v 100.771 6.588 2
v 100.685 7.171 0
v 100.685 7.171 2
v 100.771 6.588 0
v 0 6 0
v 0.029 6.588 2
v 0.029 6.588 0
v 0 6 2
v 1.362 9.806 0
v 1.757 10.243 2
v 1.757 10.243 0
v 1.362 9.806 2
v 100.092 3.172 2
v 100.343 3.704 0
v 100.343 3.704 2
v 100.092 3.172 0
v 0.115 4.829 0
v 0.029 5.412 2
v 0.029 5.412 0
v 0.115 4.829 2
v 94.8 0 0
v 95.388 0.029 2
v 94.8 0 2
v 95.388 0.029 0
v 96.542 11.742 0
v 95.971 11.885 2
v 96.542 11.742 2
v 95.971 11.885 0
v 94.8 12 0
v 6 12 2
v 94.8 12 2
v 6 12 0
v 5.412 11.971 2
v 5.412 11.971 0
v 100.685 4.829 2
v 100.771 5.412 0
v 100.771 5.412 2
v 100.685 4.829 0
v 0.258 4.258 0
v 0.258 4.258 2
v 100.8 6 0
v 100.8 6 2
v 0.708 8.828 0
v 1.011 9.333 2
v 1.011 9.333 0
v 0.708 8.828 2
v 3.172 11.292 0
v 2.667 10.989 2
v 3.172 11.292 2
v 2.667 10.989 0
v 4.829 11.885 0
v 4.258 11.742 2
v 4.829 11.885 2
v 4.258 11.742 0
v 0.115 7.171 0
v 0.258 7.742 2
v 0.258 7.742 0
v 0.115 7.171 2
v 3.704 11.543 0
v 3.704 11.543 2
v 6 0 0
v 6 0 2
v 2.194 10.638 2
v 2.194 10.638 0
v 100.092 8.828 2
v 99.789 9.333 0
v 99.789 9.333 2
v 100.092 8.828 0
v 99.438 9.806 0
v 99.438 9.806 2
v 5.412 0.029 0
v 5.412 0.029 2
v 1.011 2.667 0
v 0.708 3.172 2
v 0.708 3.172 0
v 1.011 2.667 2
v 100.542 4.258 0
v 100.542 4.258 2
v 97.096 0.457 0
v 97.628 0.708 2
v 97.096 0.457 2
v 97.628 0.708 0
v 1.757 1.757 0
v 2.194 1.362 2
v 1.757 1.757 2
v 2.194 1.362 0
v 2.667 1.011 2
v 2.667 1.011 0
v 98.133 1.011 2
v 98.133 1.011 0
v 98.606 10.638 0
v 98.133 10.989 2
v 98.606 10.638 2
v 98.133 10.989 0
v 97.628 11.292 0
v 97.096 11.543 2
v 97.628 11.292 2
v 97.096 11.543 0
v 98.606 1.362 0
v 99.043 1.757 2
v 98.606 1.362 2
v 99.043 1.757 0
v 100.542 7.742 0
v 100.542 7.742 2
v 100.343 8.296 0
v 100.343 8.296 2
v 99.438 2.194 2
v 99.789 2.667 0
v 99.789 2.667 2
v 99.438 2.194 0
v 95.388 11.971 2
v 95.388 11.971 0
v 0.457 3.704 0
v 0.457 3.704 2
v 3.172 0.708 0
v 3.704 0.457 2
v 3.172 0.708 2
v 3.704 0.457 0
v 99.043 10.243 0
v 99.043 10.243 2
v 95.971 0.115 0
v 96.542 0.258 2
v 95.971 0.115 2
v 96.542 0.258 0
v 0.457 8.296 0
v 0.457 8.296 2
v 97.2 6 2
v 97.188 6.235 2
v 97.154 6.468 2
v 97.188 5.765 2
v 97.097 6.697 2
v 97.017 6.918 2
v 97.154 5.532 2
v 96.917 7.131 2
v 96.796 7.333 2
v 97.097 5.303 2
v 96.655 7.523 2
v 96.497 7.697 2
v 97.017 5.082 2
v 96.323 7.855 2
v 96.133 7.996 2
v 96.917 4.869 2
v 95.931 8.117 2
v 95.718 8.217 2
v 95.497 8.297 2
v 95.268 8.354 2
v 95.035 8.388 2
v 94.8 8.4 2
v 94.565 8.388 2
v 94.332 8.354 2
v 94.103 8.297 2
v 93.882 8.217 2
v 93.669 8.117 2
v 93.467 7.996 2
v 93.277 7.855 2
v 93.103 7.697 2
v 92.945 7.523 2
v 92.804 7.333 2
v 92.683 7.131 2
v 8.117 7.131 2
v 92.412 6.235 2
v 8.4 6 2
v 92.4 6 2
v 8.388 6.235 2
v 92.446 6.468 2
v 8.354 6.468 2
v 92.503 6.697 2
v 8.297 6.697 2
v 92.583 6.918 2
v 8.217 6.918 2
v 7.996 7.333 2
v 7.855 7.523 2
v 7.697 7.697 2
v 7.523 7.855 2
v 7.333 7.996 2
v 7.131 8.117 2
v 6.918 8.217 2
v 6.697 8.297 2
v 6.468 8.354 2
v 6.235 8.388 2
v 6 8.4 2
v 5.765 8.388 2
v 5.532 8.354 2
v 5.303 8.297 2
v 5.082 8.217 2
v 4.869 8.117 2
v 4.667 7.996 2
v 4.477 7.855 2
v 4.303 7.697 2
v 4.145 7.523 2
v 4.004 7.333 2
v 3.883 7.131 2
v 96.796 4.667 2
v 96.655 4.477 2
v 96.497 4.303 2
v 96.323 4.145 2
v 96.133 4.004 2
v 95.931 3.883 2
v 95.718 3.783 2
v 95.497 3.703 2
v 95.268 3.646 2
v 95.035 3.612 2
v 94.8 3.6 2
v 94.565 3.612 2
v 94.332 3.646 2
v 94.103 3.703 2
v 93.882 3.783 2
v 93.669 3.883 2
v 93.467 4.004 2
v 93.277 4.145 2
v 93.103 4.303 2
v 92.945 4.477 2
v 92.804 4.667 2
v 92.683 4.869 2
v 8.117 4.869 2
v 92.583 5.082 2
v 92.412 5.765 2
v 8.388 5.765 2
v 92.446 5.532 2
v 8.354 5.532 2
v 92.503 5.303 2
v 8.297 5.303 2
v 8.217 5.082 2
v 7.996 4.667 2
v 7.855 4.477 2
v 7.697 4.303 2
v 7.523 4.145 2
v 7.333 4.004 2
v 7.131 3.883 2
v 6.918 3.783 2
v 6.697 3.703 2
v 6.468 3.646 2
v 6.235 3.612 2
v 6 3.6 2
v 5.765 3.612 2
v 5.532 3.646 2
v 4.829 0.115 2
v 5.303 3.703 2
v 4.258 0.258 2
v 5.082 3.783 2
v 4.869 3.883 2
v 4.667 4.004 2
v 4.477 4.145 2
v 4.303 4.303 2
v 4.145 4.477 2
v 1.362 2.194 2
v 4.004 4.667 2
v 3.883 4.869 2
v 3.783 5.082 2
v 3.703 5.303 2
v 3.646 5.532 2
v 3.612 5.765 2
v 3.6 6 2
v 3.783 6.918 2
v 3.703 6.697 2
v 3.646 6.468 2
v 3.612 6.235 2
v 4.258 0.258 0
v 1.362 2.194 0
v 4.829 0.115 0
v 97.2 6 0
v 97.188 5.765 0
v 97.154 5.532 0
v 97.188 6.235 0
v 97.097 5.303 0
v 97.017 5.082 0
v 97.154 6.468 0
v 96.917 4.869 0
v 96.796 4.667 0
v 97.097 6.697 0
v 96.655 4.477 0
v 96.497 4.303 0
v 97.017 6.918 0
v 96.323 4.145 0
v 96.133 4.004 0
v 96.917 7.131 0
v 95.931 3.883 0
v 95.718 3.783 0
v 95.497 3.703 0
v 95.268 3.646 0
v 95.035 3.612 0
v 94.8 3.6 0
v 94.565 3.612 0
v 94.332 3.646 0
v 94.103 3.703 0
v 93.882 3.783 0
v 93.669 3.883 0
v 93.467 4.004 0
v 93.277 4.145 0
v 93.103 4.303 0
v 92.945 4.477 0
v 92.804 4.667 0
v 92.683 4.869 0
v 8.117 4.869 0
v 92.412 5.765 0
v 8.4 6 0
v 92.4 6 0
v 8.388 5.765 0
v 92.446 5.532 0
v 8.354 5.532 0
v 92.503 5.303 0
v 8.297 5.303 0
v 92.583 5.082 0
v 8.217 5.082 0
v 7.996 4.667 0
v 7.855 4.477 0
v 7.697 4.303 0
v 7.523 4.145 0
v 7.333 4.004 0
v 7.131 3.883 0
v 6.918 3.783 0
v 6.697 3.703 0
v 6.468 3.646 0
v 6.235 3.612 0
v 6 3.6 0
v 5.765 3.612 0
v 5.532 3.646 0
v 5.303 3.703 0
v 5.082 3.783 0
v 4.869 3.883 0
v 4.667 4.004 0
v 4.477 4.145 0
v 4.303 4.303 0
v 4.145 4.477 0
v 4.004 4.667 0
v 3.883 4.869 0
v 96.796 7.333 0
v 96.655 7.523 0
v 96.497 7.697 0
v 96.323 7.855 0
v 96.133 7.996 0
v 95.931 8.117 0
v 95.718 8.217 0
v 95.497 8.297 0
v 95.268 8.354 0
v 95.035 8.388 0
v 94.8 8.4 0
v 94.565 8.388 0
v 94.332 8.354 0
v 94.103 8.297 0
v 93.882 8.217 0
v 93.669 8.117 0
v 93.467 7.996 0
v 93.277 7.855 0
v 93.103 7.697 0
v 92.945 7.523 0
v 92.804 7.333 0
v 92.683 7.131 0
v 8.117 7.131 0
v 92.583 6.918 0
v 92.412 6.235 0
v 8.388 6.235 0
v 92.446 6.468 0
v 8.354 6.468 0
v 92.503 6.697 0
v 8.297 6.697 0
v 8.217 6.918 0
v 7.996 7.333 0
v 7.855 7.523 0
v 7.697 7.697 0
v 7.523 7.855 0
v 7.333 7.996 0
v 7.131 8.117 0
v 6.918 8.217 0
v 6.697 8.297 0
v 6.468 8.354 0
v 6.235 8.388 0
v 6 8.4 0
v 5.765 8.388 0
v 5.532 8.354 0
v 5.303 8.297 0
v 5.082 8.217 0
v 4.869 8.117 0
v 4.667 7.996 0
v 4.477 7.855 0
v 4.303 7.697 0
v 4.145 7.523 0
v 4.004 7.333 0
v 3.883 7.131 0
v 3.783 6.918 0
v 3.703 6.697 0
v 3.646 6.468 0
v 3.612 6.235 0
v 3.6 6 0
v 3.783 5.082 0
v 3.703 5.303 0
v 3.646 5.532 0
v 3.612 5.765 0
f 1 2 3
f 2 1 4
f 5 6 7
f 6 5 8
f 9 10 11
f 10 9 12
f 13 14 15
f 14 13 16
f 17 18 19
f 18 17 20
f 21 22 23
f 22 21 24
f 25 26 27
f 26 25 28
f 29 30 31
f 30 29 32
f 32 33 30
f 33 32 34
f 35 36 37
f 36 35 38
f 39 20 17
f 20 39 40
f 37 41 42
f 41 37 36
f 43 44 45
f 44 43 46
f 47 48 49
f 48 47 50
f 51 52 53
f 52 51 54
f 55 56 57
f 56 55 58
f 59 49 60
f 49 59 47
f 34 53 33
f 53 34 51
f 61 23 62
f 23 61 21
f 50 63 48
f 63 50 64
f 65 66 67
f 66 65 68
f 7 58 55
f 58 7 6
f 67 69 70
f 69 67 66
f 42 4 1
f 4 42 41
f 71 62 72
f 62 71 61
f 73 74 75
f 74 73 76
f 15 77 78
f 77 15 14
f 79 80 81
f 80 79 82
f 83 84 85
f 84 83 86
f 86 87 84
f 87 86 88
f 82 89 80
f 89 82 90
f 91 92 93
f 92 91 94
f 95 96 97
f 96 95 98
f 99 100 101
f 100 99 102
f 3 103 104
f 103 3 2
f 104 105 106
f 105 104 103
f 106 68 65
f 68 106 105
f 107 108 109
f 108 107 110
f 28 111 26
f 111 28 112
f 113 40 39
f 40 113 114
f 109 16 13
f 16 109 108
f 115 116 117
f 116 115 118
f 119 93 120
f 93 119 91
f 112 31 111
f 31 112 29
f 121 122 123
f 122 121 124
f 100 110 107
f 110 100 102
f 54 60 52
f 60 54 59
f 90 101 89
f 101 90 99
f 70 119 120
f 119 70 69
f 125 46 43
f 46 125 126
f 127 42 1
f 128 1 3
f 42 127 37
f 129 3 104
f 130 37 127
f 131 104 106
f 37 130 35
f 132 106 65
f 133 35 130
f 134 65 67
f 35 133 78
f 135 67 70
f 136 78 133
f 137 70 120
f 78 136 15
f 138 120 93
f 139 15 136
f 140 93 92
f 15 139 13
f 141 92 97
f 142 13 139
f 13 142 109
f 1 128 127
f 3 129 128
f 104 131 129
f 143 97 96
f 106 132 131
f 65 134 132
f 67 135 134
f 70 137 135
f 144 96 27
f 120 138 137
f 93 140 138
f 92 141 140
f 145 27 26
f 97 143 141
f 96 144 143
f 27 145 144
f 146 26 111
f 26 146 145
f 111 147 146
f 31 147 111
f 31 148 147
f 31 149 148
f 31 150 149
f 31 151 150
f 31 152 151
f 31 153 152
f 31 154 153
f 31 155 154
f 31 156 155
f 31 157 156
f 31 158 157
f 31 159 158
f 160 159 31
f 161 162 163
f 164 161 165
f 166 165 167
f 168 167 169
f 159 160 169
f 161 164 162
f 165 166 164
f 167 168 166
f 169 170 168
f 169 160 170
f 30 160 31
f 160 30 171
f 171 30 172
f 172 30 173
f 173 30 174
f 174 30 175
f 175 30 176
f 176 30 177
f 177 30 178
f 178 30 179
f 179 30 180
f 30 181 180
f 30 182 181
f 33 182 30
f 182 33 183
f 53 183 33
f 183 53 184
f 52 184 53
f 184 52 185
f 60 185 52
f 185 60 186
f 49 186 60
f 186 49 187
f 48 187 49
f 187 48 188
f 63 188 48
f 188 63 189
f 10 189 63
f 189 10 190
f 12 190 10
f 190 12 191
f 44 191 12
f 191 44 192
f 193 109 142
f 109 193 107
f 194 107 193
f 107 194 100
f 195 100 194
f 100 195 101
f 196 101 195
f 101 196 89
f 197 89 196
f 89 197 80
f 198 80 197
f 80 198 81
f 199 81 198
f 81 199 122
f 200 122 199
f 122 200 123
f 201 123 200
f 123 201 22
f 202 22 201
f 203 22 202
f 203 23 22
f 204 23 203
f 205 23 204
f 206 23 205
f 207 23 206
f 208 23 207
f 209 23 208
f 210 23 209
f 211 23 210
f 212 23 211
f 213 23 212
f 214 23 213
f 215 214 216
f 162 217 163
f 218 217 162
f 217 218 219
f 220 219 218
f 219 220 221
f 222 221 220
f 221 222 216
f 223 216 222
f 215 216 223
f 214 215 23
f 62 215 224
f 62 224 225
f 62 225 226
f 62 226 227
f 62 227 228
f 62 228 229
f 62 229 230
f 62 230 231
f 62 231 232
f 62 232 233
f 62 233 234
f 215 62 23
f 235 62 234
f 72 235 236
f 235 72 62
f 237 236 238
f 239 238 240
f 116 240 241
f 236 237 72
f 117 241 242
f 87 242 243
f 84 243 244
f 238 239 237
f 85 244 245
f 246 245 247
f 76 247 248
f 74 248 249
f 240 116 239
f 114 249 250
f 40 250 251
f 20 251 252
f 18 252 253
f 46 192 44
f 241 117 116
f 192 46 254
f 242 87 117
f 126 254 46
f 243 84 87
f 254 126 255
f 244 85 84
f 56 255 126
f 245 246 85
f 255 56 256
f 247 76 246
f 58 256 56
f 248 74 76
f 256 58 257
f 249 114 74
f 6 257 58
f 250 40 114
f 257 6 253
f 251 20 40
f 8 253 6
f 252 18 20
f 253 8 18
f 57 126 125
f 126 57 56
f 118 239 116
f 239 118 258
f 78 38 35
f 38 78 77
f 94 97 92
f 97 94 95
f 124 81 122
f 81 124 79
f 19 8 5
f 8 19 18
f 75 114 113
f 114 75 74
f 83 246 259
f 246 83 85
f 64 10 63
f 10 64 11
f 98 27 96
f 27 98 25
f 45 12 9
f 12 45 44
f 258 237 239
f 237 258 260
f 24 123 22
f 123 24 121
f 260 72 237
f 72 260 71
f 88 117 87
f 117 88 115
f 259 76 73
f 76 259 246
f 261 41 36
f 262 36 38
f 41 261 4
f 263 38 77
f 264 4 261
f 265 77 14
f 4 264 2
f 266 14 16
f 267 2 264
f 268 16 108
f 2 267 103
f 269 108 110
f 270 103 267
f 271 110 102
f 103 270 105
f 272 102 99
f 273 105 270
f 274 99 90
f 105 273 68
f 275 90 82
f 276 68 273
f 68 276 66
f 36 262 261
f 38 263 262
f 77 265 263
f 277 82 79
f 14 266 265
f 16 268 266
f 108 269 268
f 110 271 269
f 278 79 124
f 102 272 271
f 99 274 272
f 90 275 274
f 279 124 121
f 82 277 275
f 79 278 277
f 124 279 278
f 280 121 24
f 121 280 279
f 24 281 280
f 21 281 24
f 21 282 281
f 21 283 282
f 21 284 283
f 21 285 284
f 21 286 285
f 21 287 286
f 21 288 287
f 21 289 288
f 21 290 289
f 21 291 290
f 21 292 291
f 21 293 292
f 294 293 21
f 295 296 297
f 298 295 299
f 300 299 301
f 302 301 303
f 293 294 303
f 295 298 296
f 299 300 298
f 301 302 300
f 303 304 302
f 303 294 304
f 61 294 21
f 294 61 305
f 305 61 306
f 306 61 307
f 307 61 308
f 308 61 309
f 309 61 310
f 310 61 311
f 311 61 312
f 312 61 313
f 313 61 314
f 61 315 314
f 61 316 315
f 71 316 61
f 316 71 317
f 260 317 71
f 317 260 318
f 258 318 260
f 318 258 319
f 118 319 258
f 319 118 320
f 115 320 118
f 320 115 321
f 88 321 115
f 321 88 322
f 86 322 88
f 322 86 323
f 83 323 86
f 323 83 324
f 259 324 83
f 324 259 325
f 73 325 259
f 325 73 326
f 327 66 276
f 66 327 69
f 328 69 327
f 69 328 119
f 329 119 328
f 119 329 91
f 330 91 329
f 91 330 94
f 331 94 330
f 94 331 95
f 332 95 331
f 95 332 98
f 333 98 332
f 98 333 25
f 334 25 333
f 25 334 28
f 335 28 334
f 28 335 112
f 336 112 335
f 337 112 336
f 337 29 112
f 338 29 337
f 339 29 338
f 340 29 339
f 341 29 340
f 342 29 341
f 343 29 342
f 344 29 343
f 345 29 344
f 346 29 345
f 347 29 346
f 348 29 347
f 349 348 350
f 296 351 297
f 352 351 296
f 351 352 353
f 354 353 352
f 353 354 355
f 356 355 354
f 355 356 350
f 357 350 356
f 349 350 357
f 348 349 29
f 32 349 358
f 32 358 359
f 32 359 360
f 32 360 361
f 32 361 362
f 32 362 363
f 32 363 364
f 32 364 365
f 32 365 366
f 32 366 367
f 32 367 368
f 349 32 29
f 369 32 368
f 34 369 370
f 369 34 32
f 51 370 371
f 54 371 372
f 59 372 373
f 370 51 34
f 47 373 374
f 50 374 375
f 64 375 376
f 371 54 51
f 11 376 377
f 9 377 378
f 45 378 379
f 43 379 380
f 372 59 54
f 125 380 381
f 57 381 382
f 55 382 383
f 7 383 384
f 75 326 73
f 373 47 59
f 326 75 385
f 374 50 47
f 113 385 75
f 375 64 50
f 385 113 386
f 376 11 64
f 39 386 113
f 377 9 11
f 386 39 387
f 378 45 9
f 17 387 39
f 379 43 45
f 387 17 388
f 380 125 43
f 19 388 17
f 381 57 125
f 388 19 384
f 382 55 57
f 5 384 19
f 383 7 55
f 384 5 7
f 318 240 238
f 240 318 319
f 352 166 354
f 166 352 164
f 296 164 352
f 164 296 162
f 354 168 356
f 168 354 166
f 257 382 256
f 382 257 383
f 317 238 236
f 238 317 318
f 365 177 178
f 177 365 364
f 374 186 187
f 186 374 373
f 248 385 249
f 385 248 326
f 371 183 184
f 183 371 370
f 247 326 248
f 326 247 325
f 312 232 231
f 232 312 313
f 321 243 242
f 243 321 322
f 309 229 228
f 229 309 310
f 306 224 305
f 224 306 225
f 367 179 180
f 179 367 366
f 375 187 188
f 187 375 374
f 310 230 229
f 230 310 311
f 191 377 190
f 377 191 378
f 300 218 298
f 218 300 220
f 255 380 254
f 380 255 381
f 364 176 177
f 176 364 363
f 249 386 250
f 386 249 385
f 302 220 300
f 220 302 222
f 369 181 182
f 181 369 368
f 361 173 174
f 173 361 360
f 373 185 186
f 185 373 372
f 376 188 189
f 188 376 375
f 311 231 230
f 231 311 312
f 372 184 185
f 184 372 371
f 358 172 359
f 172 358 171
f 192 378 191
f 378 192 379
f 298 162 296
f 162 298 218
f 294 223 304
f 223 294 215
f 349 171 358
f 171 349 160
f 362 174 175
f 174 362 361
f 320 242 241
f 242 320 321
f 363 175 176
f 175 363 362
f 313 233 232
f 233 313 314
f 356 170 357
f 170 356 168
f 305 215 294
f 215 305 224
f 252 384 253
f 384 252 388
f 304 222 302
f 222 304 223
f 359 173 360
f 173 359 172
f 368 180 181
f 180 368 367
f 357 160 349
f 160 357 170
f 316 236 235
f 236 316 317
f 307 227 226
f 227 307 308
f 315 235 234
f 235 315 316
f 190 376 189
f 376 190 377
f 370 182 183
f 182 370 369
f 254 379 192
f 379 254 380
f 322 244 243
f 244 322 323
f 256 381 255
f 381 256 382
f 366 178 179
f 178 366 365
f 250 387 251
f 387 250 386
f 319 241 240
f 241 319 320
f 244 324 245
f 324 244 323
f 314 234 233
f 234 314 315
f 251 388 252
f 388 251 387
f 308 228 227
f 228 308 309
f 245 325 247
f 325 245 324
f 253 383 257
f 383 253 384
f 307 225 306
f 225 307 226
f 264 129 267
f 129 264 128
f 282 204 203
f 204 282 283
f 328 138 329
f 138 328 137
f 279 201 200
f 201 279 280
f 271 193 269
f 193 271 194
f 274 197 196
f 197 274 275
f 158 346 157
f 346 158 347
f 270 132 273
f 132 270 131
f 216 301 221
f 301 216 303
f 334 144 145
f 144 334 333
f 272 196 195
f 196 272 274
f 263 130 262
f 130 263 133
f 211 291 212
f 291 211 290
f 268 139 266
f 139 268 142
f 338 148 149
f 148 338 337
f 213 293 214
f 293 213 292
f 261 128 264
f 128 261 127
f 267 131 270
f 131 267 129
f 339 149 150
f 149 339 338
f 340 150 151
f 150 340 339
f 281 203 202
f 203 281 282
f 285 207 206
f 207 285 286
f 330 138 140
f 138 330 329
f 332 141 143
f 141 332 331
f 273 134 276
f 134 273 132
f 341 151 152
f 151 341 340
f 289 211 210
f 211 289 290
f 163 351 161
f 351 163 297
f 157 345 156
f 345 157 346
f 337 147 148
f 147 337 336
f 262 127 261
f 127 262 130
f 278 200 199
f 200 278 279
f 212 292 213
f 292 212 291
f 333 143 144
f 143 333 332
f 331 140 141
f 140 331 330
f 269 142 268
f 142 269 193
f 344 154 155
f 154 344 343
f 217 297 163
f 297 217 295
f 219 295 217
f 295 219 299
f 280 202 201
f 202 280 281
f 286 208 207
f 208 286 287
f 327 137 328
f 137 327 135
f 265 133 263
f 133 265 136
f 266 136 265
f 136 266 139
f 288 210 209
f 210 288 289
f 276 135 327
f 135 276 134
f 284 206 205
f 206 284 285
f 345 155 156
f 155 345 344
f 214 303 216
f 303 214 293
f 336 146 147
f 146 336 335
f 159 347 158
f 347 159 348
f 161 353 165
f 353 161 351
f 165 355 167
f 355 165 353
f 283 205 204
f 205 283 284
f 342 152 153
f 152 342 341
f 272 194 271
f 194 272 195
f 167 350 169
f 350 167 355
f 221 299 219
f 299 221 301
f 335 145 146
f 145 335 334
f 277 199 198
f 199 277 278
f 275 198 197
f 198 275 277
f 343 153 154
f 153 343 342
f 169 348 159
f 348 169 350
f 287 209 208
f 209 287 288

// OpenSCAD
/*
    Parametric M4 long two-hole tab
    -----------------------------------------
    Pill-shaped tab with two loose M4 clearance holes.

    Copy the alignment values from cad/box-generator.scad so the holes
    line up with the two holes placed to the left and right of the cutout.

    Orientation:
      XY = tab outline
      Z  = tab thickness
      Z = 0 is the print-bed face
*/


/* [Box alignment] */

// Copy from box-generator.scad
front_cutout_width = 78.8;

// Copy from box-generator.scad
cutout_side_hole_center_offset = 5;

// Copy from box-generator.scad
cutout_side_hole_diameter = 4.8;

// Center-to-center spacing between the two box cutout side holes
hole_spacing = front_cutout_width + 2 * cutout_side_hole_center_offset;


/* [Tab size] */

tab_height = 12;

// Default keeps each hole centered in one rounded end.
tab_width = hole_spacing + tab_height;

tab_thickness = 2;


/* [Rendering] */

$fn = 64;
epsilon = 0.1;


tab_end_radius = tab_height / 2;
hole_left_x = (tab_width - hole_spacing) / 2;
hole_right_x = (tab_width + hole_spacing) / 2;
hole_y = tab_height / 2;


module rounded_tab_outline() {
    hull() {
        translate([
            tab_end_radius,
            tab_end_radius
        ])
        circle(r = tab_end_radius);

        translate([
            tab_width - tab_end_radius,
            tab_end_radius
        ])
        circle(r = tab_end_radius);
    }
}


module screw_clearance_hole(x) {
    translate([
        x,
        hole_y,
        -epsilon
    ])
    cylinder(
        d = cutout_side_hole_diameter,
        h = tab_thickness + 2 * epsilon
    );
}


module long_two_hole_tab() {
    difference() {
        linear_extrude(height = tab_thickness)
        rounded_tab_outline();

        screw_clearance_hole(hole_left_x);
        screw_clearance_hole(hole_right_x);
    }
}


assert(front_cutout_width > 0, "front_cutout_width must be positive");
assert(
    cutout_side_hole_center_offset > 0,
    "cutout_side_hole_center_offset must be positive"
);
assert(
    cutout_side_hole_diameter > 0,
    "cutout_side_hole_diameter must be positive"
);
assert(tab_width > 0, "tab_width must be positive");
assert(tab_height > 0, "tab_height must be positive");
assert(tab_thickness > 0, "tab_thickness must be positive");
assert(
    tab_width >= tab_height,
    "tab_width must be at least tab_height for fully rounded ends"
);
assert(
    cutout_side_hole_diameter < tab_height,
    "cutout_side_hole_diameter must be smaller than tab_height"
);
assert(
    hole_spacing > cutout_side_hole_diameter,
    "hole_spacing must be larger than the hole diameter"
);
assert(
    hole_left_x >= cutout_side_hole_diameter / 2,
    "Left hole would break through the left end"
);
assert(
    hole_right_x <= tab_width - cutout_side_hole_diameter / 2,
    "Right hole would break through the right end"
);

long_two_hole_tab();
